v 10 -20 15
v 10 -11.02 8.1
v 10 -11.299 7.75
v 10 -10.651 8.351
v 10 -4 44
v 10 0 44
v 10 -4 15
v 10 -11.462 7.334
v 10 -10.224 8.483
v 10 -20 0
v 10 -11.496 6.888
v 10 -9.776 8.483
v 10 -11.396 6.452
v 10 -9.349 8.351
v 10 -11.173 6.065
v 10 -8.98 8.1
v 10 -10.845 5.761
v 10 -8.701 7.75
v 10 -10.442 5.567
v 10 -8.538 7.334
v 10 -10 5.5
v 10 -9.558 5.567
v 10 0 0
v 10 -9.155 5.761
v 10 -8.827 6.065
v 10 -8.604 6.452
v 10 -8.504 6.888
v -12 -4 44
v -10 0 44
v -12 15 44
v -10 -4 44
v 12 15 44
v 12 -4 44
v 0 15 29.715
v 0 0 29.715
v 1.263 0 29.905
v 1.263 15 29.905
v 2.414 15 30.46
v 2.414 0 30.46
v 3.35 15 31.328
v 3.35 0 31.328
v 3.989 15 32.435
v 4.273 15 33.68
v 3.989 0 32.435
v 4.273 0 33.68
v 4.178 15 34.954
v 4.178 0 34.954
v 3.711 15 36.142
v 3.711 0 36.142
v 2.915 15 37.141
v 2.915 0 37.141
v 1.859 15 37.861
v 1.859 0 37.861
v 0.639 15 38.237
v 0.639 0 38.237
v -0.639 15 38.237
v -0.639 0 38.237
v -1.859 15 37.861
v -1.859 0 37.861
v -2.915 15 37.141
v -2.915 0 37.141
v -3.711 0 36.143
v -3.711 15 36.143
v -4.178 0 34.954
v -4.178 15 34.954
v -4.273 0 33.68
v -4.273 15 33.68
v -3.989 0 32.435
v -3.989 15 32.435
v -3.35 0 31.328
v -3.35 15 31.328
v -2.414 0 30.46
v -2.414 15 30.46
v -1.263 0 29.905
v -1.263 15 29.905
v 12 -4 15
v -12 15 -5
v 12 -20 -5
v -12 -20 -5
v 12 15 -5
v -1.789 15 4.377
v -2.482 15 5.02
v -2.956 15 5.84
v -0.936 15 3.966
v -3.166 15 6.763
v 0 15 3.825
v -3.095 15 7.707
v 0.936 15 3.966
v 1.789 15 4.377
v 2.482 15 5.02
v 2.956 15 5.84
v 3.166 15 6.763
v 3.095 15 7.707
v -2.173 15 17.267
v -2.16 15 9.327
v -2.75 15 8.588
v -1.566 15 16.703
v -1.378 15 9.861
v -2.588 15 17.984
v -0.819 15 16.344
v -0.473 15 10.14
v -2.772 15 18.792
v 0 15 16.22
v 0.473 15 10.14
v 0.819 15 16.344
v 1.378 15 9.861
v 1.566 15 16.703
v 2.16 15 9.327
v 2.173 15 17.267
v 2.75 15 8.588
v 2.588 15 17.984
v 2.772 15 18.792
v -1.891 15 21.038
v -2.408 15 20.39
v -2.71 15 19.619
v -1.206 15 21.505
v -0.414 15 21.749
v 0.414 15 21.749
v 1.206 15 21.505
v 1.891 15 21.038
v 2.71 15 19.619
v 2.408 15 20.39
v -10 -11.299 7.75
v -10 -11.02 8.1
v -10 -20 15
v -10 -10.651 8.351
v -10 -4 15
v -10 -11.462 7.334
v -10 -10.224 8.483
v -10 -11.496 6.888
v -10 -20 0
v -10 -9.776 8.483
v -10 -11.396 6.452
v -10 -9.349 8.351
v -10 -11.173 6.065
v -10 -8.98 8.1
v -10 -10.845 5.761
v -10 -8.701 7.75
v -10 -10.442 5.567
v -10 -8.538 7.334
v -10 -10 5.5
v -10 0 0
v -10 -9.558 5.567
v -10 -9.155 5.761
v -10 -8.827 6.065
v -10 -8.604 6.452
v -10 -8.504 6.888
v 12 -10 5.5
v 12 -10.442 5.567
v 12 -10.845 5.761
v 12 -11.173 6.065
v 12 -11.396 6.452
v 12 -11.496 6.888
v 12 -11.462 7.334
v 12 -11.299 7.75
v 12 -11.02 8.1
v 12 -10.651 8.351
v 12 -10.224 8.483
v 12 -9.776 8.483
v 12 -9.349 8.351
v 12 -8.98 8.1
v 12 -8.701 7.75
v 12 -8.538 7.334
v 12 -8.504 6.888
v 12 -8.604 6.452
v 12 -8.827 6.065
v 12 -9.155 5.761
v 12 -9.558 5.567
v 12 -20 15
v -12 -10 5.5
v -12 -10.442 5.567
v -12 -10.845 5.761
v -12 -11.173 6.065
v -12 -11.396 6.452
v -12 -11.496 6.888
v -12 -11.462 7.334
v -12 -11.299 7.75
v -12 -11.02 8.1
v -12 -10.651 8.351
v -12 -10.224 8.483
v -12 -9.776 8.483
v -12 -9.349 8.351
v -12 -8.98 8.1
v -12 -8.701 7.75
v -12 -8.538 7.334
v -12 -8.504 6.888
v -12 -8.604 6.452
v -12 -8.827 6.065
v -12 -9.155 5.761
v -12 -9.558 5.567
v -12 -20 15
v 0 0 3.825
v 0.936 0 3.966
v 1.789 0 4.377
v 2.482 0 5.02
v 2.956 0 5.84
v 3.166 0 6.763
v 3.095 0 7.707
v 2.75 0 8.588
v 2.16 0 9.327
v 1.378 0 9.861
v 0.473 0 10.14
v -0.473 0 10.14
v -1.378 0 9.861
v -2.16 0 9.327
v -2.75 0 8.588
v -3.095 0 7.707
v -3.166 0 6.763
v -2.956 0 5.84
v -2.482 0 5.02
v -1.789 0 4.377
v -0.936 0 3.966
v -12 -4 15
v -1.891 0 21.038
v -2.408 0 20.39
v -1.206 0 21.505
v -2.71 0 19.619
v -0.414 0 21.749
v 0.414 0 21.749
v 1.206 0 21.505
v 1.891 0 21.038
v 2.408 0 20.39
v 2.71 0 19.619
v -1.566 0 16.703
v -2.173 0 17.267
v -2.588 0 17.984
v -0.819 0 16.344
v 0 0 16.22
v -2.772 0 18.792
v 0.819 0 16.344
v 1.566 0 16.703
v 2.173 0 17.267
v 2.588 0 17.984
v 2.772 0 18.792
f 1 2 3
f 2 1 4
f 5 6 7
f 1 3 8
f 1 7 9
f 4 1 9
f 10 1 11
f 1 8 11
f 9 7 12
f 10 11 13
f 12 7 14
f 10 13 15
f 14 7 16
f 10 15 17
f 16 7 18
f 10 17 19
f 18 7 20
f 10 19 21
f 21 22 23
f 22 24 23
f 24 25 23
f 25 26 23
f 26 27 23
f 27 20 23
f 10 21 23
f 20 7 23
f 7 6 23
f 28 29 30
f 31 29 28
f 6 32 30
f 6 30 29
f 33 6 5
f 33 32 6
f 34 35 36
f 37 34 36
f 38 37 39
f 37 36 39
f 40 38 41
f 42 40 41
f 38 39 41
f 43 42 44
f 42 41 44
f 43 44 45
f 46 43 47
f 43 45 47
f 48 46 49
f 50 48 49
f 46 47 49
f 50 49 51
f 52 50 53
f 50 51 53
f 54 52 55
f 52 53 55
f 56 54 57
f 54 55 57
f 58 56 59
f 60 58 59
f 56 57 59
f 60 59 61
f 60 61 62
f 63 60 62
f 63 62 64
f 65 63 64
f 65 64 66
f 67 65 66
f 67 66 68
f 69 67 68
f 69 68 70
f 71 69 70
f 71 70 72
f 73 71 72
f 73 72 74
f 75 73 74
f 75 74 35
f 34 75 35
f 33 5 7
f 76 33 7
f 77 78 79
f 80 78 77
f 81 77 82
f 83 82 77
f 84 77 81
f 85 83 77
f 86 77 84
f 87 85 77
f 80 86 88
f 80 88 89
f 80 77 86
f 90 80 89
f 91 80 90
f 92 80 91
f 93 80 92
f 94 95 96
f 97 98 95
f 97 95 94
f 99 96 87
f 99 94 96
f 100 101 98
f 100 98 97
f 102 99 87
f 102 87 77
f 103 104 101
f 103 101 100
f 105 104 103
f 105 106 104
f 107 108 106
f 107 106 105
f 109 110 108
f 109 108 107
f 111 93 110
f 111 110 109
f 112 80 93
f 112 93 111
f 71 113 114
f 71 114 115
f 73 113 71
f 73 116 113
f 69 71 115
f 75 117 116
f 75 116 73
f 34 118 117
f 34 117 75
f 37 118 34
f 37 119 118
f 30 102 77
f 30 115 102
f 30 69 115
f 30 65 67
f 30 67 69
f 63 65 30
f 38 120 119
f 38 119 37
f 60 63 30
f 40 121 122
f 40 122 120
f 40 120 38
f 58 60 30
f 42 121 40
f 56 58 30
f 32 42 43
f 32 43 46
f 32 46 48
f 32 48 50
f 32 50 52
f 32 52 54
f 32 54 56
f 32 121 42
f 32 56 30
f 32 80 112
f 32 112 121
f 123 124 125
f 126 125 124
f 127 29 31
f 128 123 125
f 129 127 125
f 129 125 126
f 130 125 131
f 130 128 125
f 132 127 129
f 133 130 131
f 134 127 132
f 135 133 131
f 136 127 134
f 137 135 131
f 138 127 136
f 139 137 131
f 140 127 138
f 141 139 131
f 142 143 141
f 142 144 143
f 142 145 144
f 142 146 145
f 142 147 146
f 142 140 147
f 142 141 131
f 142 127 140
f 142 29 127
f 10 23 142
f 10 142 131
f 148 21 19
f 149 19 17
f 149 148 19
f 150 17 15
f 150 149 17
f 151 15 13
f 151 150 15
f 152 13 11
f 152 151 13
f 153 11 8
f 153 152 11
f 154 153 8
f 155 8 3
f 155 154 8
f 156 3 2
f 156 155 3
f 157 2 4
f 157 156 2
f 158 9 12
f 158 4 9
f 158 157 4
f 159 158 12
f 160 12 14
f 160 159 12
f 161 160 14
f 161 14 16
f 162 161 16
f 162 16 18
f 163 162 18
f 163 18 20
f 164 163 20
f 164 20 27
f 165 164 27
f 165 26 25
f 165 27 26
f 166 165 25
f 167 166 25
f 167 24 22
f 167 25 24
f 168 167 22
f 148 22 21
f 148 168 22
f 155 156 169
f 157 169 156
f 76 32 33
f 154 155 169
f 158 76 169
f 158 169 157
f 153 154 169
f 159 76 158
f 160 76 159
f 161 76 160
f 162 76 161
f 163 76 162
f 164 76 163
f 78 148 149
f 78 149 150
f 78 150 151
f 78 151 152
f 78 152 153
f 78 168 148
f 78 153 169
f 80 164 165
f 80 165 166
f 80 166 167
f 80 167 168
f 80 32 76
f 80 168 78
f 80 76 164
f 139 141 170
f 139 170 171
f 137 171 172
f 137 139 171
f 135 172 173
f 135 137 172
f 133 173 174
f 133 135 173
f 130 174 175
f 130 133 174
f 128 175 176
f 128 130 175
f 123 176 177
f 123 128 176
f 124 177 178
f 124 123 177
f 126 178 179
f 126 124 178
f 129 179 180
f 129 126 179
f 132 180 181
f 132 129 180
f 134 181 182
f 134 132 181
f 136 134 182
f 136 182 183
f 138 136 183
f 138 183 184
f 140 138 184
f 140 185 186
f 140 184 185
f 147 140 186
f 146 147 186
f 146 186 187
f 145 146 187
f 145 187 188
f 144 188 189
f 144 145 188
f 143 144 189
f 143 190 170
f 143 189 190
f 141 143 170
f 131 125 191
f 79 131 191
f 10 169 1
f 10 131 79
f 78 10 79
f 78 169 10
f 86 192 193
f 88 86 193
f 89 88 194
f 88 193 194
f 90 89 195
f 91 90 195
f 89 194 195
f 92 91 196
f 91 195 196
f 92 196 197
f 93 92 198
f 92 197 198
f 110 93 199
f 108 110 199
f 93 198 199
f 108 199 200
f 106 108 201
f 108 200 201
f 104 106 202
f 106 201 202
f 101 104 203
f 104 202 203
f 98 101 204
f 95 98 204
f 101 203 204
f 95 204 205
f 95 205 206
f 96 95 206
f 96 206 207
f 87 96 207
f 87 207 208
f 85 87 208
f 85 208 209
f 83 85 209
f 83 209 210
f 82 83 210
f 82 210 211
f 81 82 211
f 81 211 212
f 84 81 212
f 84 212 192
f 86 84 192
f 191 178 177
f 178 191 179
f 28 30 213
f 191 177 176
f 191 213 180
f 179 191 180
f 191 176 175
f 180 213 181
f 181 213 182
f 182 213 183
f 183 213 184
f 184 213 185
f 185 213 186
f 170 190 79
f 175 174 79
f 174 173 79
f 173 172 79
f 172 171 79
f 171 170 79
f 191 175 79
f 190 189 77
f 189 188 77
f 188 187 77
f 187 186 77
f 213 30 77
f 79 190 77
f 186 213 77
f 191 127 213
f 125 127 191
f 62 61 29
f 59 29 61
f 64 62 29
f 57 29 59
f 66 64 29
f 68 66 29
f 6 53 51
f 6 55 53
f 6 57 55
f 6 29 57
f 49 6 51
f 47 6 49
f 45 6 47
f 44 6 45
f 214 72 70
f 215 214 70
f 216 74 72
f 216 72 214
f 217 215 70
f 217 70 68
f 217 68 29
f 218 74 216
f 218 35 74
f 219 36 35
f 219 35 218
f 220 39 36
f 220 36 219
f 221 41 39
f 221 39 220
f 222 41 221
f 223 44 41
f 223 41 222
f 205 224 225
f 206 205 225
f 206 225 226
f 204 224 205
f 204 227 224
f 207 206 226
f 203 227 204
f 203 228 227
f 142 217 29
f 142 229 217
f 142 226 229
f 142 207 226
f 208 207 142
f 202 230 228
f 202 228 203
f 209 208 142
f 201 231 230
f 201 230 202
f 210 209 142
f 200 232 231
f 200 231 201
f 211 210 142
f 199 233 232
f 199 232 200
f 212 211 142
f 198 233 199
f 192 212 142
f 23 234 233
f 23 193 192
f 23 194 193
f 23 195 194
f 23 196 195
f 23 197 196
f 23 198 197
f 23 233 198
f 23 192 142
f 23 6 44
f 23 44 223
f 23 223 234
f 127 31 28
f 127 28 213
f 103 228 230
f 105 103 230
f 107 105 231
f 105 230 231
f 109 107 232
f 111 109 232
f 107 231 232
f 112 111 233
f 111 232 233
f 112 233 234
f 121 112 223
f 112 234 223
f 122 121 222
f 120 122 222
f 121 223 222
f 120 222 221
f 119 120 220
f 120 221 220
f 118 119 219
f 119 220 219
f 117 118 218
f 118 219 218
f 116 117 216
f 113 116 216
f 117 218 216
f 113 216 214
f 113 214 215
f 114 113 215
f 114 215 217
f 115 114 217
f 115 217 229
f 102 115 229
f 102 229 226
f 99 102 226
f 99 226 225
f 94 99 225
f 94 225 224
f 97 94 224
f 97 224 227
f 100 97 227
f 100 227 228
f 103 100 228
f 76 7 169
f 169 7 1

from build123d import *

# Parameters (mm, degrees)
BOSS_EXTRUDE1_DEPTH = 10
BOSS_EXTRUDE2_DEPTH = 2
SKETCH4_R           = 4.285
SKETCH4_R_2         = 2.78
SKETCH4_R_3         = 3.175
CUT_EXTRUDE1_DEPTH  = 50.799598392
SKETCH5_R           = 1.5
CUT_EXTRUDE2_DEPTH  = 65.124878168


with BuildPart() as part:
    # Sketch2 → Boss-Extrude1 (new, symmetric)
    with BuildSketch(Plane(origin=(0, 0, 0), x_dir=(0, 0, -1), z_dir=(1, 0, 0))):
        Polygon((-44, 0), (0, 0), (0, -20), (5, -20), (5, 15), (-44, 15), align=None)
    extrude(amount=BOSS_EXTRUDE1_DEPTH, both=True)

    # Sketch3 → Boss-Extrude2 (add)
    with BuildSketch(Plane(origin=(10, 0, 0), x_dir=(0, 0, -1), z_dir=(1, 0, 0))):
        Polygon((-44, 15), (-44, -4), (-15, -4), (-15, -20), (5, -20), (5, 15), align=None)
    boss_extrude2 = extrude(amount=BOSS_EXTRUDE2_DEPTH)

    # Mirror1: Boss-Extrude2 across plane
    add(boss_extrude2.mirror(Plane(origin=(0, 0, 0), x_dir=(0, 0, 1), z_dir=(1, 0, 0))))

    # Sketch4 → Cut-Extrude1 (cut, through all)
    with BuildSketch(Plane.XZ):
        with Locations(Location((0, 34, 0), (0, 0, 270))):
            Circle(SKETCH4_R)
        with Locations(Location((0, 19, 0), (0, 0, 270))):
            Circle(SKETCH4_R_2)
        with Locations(Location((0, 7, 0), (0, 0, 270))):
            Circle(SKETCH4_R_3)
    extrude(amount=-CUT_EXTRUDE1_DEPTH, mode=Mode.SUBTRACT)

    # Sketch5 → Cut-Extrude2 (cut, through all)
    with BuildSketch(Plane(origin=(12, 0, -12), x_dir=(0, 0, 1), z_dir=(-1, 0, 0))):
        with Locations(Location((19, -10, 0), (0, 0, 180))):
            Circle(SKETCH5_R)
    extrude(amount=CUT_EXTRUDE2_DEPTH, mode=Mode.SUBTRACT)


solid = part.part
